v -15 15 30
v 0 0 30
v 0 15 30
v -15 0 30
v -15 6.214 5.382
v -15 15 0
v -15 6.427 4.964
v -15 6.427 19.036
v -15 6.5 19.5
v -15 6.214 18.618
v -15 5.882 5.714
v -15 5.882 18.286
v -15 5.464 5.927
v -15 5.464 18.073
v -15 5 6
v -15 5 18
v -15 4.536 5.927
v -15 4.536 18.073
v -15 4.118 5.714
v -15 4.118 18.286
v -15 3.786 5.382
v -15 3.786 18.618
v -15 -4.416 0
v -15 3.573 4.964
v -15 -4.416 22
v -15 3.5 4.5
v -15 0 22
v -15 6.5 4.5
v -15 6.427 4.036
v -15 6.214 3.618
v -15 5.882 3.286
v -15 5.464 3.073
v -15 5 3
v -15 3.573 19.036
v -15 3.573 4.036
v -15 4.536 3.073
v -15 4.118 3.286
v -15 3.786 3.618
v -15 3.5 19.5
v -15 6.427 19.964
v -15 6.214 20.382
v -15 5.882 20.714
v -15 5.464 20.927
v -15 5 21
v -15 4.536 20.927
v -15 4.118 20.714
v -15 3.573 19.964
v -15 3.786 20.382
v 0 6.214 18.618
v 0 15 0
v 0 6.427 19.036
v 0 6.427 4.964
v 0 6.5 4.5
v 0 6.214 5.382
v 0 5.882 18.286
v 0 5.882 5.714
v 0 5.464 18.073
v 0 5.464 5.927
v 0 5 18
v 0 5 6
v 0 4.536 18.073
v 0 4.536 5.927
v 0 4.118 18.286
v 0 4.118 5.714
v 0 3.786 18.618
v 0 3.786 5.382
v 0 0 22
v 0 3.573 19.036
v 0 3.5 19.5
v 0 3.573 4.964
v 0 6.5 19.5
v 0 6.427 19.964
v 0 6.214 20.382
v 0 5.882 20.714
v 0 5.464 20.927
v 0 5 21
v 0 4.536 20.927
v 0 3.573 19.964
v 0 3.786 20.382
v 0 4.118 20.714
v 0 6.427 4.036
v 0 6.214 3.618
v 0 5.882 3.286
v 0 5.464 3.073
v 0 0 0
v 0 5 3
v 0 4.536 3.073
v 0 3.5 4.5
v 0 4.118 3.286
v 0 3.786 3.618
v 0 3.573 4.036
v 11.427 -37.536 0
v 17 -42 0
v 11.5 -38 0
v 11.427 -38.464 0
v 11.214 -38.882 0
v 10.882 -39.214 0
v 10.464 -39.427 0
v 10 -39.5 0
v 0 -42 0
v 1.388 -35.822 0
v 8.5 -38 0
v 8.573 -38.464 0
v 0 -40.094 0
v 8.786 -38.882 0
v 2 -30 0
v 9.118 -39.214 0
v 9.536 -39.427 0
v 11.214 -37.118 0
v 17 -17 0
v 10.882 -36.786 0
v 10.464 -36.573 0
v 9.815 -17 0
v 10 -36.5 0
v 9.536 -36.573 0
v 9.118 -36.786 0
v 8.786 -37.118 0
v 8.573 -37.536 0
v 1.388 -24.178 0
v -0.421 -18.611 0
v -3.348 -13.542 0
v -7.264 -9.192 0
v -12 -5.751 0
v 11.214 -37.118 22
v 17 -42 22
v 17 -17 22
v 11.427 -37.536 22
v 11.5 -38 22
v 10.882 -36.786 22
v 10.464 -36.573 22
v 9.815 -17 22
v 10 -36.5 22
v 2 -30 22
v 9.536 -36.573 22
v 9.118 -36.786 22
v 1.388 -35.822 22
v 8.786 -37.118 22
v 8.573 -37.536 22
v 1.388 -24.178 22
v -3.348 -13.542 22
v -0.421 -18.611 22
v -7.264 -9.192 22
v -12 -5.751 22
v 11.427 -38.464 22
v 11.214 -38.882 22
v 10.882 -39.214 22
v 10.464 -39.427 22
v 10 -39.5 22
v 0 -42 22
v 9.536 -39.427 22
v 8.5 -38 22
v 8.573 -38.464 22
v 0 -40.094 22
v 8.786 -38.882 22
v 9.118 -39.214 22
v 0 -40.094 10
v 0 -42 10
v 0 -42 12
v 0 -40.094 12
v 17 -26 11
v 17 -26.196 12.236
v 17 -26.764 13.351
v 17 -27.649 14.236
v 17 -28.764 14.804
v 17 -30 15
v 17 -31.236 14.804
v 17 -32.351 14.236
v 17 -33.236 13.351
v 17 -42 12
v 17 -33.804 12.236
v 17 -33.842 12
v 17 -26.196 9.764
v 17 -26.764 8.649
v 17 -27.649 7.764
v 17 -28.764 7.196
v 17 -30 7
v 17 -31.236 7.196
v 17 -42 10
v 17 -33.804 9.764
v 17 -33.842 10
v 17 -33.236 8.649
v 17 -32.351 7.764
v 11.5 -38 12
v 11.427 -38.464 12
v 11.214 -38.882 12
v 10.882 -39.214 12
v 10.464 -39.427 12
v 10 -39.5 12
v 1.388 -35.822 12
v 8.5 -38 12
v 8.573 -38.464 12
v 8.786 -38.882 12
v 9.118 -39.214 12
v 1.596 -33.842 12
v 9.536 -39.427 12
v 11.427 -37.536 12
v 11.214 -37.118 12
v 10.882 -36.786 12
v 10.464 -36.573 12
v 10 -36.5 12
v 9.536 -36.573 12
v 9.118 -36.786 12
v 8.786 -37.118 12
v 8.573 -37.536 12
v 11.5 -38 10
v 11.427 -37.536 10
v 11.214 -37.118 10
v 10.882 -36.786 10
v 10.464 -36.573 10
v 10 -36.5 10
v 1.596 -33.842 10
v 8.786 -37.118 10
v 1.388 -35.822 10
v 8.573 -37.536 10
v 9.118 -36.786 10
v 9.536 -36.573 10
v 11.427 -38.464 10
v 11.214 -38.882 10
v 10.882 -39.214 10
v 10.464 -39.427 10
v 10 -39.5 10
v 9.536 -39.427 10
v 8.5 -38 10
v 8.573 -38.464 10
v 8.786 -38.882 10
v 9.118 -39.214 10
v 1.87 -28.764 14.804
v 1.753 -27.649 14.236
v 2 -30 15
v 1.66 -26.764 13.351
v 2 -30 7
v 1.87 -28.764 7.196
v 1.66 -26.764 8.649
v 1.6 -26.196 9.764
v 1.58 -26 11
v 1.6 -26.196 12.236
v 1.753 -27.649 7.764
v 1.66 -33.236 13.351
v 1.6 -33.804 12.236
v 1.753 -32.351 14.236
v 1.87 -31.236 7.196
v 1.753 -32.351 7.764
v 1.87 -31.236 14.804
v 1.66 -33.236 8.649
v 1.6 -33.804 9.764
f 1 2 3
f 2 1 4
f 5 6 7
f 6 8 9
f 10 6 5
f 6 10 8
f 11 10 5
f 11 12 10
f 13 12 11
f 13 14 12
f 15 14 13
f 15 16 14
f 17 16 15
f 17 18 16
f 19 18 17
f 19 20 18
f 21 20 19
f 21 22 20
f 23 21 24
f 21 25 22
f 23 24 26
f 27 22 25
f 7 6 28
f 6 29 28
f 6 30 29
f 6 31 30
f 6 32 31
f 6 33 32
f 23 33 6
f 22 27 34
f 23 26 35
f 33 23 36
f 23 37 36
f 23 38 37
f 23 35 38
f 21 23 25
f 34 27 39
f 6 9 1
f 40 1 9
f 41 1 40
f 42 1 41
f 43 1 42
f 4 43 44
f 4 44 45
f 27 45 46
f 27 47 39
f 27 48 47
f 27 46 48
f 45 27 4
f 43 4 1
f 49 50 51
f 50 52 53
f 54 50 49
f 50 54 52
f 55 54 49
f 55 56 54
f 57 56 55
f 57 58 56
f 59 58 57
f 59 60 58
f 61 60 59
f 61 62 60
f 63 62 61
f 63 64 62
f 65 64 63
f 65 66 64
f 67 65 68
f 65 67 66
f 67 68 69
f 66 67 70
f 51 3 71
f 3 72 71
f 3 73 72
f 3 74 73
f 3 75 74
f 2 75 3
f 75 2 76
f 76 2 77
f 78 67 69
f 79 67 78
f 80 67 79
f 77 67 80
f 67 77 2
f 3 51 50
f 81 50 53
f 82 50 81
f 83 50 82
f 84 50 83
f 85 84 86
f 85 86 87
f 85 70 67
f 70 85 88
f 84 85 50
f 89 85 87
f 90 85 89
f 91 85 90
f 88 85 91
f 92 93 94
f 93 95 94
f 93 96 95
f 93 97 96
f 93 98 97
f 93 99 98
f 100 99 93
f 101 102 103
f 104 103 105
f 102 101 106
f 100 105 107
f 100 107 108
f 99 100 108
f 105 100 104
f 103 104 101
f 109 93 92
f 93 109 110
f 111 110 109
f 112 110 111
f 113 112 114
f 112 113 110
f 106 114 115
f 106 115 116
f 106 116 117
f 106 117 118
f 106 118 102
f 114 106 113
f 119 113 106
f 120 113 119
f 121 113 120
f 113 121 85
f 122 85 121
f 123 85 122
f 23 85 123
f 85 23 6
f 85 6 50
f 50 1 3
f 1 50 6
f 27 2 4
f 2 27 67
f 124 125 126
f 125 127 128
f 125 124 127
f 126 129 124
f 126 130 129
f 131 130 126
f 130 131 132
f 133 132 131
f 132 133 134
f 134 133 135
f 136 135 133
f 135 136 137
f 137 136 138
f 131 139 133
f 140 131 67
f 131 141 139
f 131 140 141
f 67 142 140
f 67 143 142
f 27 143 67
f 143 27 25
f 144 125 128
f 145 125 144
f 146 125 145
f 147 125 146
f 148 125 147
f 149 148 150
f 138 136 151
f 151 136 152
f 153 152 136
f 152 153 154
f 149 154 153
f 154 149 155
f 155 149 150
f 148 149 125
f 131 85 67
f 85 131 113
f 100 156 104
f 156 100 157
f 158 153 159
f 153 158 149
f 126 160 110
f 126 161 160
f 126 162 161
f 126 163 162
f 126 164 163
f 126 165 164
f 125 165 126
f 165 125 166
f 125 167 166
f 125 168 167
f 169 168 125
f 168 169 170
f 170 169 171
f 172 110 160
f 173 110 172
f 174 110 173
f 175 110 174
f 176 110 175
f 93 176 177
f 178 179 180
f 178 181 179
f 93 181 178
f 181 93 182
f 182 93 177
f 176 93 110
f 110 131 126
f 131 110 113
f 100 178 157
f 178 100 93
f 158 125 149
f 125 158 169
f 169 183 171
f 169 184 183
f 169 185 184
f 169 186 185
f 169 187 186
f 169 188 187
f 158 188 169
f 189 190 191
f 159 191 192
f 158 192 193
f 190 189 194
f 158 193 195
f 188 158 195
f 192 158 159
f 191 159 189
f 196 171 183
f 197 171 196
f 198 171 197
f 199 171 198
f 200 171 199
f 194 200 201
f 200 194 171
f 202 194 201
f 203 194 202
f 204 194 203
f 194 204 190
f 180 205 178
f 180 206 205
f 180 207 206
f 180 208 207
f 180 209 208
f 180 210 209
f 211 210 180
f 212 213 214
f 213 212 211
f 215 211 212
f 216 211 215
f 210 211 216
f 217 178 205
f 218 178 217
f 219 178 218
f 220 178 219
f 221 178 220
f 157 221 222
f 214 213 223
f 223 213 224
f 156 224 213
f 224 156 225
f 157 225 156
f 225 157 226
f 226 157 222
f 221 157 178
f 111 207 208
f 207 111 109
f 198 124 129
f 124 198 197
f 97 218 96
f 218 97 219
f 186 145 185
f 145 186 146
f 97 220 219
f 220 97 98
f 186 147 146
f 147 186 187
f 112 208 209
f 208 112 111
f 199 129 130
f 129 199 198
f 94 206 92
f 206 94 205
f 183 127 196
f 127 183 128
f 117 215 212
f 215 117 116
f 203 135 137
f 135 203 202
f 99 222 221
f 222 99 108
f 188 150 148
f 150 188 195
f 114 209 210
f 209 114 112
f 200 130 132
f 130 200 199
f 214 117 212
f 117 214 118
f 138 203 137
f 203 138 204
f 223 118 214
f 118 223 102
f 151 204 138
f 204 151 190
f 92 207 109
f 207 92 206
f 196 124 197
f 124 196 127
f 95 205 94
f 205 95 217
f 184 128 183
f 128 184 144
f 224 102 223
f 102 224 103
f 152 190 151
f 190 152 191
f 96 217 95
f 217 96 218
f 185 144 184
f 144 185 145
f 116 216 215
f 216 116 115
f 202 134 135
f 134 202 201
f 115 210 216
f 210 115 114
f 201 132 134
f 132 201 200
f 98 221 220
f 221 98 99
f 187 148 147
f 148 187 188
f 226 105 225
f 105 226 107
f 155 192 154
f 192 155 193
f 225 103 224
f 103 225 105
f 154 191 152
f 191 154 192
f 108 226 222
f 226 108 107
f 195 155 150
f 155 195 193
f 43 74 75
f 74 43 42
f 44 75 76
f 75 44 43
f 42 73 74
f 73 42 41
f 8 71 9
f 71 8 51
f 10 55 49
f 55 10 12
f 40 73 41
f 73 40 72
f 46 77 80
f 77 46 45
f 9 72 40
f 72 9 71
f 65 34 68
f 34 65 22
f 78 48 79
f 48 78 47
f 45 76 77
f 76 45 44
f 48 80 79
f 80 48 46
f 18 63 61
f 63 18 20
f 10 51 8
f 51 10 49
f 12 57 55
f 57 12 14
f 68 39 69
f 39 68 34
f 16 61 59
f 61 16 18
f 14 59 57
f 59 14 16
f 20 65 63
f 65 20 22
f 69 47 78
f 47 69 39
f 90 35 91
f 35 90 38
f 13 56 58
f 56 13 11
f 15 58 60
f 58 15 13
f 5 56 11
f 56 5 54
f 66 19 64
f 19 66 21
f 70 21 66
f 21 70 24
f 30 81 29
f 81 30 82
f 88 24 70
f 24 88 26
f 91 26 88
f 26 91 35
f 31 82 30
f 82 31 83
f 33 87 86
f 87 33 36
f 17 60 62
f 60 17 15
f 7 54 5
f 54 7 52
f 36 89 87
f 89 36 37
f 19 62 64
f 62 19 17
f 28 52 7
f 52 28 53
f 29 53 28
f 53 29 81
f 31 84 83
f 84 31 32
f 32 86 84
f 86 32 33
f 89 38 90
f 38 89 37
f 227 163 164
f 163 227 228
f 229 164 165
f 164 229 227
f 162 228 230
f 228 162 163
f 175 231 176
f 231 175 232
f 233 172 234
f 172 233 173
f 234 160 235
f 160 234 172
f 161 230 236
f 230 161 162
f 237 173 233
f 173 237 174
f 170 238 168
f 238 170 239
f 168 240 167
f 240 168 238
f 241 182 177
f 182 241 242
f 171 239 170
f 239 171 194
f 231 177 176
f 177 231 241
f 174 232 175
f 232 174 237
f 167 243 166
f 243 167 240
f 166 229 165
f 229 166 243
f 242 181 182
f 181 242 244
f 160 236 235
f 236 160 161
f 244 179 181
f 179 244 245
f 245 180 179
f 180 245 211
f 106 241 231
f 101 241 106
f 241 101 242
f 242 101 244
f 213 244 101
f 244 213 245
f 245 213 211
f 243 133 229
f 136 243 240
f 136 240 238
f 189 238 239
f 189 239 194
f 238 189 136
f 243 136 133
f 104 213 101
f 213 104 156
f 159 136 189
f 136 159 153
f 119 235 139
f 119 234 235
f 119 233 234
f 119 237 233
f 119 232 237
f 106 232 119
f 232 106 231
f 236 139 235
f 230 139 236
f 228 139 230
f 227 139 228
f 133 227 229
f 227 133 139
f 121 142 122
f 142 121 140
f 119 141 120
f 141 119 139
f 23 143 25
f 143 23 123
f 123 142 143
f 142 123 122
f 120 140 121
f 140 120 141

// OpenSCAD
//Upright or Sideways (whichever you feel works best with your support needs/capabilities)
Orientation="Sideways";//[Upright,Sideways]

//Clamp (Requires support)
Clamp="True";//[True,False]

//Units
Units=1;//[1:mm,25.4:inches]

//Diameter of the stem where inserted into the holder
Stem_Diameter=8;

//Diameter of the dial bezel
Bezel_Diameter=56;

Stem_Radius = Stem_Diameter * Units * 0.5;
Bezel_Radius = Bezel_Diameter * Units * 0.5;

module block(){
	union(){
		translate([-12,0,0])
		cube([30,15,15]);

		translate([-12,-17,0])
		cube([22,18,15]);

		rotate(30,[1,0,0])
		translate([-12,-20,0])
		cube([22,20,15]);

		translate([-12,-42,-17])
		cube([22,25,17]);
	}
}

module mill(){
	translate([7.5,5,-2])
	cylinder(r=1.5,h=25,$fn=20);
	translate([-7.5,5,-2])
	cylinder(r=1.5,h=25,$fn=20);

	translate([-1,-30,-20])
	cylinder(r=Stem_Radius,h=40,$fn=20);

	rotate(90,[0,1,0])
	translate([30-(2*Bezel_Radius),-30,0])
	cylinder(r=Bezel_Radius,h=25, center=true,$fn=30);

	if(Clamp=="True"){
		translate([-2,-54,-20])
		cube([2,25,25]);
		rotate(90,[0,1,0])
		translate([10,-38,-20])
		cylinder(r=1.5,h=40,$fn=20);
	}else{
		rotate(90,[0,1,0])
		translate([10,-30,-20])
		cylinder(r=1.5,h=40,$fn=20);
	}	
}

module dialholder(){
	difference(){
		block();
		mill();
	}
}

if(Orientation=="Sideways"){
	rotate(-90,[0,1,0])
	translate([12,0,0])
	dialholder();
}else{
	translate([0,0,17])
	dialholder();
}






